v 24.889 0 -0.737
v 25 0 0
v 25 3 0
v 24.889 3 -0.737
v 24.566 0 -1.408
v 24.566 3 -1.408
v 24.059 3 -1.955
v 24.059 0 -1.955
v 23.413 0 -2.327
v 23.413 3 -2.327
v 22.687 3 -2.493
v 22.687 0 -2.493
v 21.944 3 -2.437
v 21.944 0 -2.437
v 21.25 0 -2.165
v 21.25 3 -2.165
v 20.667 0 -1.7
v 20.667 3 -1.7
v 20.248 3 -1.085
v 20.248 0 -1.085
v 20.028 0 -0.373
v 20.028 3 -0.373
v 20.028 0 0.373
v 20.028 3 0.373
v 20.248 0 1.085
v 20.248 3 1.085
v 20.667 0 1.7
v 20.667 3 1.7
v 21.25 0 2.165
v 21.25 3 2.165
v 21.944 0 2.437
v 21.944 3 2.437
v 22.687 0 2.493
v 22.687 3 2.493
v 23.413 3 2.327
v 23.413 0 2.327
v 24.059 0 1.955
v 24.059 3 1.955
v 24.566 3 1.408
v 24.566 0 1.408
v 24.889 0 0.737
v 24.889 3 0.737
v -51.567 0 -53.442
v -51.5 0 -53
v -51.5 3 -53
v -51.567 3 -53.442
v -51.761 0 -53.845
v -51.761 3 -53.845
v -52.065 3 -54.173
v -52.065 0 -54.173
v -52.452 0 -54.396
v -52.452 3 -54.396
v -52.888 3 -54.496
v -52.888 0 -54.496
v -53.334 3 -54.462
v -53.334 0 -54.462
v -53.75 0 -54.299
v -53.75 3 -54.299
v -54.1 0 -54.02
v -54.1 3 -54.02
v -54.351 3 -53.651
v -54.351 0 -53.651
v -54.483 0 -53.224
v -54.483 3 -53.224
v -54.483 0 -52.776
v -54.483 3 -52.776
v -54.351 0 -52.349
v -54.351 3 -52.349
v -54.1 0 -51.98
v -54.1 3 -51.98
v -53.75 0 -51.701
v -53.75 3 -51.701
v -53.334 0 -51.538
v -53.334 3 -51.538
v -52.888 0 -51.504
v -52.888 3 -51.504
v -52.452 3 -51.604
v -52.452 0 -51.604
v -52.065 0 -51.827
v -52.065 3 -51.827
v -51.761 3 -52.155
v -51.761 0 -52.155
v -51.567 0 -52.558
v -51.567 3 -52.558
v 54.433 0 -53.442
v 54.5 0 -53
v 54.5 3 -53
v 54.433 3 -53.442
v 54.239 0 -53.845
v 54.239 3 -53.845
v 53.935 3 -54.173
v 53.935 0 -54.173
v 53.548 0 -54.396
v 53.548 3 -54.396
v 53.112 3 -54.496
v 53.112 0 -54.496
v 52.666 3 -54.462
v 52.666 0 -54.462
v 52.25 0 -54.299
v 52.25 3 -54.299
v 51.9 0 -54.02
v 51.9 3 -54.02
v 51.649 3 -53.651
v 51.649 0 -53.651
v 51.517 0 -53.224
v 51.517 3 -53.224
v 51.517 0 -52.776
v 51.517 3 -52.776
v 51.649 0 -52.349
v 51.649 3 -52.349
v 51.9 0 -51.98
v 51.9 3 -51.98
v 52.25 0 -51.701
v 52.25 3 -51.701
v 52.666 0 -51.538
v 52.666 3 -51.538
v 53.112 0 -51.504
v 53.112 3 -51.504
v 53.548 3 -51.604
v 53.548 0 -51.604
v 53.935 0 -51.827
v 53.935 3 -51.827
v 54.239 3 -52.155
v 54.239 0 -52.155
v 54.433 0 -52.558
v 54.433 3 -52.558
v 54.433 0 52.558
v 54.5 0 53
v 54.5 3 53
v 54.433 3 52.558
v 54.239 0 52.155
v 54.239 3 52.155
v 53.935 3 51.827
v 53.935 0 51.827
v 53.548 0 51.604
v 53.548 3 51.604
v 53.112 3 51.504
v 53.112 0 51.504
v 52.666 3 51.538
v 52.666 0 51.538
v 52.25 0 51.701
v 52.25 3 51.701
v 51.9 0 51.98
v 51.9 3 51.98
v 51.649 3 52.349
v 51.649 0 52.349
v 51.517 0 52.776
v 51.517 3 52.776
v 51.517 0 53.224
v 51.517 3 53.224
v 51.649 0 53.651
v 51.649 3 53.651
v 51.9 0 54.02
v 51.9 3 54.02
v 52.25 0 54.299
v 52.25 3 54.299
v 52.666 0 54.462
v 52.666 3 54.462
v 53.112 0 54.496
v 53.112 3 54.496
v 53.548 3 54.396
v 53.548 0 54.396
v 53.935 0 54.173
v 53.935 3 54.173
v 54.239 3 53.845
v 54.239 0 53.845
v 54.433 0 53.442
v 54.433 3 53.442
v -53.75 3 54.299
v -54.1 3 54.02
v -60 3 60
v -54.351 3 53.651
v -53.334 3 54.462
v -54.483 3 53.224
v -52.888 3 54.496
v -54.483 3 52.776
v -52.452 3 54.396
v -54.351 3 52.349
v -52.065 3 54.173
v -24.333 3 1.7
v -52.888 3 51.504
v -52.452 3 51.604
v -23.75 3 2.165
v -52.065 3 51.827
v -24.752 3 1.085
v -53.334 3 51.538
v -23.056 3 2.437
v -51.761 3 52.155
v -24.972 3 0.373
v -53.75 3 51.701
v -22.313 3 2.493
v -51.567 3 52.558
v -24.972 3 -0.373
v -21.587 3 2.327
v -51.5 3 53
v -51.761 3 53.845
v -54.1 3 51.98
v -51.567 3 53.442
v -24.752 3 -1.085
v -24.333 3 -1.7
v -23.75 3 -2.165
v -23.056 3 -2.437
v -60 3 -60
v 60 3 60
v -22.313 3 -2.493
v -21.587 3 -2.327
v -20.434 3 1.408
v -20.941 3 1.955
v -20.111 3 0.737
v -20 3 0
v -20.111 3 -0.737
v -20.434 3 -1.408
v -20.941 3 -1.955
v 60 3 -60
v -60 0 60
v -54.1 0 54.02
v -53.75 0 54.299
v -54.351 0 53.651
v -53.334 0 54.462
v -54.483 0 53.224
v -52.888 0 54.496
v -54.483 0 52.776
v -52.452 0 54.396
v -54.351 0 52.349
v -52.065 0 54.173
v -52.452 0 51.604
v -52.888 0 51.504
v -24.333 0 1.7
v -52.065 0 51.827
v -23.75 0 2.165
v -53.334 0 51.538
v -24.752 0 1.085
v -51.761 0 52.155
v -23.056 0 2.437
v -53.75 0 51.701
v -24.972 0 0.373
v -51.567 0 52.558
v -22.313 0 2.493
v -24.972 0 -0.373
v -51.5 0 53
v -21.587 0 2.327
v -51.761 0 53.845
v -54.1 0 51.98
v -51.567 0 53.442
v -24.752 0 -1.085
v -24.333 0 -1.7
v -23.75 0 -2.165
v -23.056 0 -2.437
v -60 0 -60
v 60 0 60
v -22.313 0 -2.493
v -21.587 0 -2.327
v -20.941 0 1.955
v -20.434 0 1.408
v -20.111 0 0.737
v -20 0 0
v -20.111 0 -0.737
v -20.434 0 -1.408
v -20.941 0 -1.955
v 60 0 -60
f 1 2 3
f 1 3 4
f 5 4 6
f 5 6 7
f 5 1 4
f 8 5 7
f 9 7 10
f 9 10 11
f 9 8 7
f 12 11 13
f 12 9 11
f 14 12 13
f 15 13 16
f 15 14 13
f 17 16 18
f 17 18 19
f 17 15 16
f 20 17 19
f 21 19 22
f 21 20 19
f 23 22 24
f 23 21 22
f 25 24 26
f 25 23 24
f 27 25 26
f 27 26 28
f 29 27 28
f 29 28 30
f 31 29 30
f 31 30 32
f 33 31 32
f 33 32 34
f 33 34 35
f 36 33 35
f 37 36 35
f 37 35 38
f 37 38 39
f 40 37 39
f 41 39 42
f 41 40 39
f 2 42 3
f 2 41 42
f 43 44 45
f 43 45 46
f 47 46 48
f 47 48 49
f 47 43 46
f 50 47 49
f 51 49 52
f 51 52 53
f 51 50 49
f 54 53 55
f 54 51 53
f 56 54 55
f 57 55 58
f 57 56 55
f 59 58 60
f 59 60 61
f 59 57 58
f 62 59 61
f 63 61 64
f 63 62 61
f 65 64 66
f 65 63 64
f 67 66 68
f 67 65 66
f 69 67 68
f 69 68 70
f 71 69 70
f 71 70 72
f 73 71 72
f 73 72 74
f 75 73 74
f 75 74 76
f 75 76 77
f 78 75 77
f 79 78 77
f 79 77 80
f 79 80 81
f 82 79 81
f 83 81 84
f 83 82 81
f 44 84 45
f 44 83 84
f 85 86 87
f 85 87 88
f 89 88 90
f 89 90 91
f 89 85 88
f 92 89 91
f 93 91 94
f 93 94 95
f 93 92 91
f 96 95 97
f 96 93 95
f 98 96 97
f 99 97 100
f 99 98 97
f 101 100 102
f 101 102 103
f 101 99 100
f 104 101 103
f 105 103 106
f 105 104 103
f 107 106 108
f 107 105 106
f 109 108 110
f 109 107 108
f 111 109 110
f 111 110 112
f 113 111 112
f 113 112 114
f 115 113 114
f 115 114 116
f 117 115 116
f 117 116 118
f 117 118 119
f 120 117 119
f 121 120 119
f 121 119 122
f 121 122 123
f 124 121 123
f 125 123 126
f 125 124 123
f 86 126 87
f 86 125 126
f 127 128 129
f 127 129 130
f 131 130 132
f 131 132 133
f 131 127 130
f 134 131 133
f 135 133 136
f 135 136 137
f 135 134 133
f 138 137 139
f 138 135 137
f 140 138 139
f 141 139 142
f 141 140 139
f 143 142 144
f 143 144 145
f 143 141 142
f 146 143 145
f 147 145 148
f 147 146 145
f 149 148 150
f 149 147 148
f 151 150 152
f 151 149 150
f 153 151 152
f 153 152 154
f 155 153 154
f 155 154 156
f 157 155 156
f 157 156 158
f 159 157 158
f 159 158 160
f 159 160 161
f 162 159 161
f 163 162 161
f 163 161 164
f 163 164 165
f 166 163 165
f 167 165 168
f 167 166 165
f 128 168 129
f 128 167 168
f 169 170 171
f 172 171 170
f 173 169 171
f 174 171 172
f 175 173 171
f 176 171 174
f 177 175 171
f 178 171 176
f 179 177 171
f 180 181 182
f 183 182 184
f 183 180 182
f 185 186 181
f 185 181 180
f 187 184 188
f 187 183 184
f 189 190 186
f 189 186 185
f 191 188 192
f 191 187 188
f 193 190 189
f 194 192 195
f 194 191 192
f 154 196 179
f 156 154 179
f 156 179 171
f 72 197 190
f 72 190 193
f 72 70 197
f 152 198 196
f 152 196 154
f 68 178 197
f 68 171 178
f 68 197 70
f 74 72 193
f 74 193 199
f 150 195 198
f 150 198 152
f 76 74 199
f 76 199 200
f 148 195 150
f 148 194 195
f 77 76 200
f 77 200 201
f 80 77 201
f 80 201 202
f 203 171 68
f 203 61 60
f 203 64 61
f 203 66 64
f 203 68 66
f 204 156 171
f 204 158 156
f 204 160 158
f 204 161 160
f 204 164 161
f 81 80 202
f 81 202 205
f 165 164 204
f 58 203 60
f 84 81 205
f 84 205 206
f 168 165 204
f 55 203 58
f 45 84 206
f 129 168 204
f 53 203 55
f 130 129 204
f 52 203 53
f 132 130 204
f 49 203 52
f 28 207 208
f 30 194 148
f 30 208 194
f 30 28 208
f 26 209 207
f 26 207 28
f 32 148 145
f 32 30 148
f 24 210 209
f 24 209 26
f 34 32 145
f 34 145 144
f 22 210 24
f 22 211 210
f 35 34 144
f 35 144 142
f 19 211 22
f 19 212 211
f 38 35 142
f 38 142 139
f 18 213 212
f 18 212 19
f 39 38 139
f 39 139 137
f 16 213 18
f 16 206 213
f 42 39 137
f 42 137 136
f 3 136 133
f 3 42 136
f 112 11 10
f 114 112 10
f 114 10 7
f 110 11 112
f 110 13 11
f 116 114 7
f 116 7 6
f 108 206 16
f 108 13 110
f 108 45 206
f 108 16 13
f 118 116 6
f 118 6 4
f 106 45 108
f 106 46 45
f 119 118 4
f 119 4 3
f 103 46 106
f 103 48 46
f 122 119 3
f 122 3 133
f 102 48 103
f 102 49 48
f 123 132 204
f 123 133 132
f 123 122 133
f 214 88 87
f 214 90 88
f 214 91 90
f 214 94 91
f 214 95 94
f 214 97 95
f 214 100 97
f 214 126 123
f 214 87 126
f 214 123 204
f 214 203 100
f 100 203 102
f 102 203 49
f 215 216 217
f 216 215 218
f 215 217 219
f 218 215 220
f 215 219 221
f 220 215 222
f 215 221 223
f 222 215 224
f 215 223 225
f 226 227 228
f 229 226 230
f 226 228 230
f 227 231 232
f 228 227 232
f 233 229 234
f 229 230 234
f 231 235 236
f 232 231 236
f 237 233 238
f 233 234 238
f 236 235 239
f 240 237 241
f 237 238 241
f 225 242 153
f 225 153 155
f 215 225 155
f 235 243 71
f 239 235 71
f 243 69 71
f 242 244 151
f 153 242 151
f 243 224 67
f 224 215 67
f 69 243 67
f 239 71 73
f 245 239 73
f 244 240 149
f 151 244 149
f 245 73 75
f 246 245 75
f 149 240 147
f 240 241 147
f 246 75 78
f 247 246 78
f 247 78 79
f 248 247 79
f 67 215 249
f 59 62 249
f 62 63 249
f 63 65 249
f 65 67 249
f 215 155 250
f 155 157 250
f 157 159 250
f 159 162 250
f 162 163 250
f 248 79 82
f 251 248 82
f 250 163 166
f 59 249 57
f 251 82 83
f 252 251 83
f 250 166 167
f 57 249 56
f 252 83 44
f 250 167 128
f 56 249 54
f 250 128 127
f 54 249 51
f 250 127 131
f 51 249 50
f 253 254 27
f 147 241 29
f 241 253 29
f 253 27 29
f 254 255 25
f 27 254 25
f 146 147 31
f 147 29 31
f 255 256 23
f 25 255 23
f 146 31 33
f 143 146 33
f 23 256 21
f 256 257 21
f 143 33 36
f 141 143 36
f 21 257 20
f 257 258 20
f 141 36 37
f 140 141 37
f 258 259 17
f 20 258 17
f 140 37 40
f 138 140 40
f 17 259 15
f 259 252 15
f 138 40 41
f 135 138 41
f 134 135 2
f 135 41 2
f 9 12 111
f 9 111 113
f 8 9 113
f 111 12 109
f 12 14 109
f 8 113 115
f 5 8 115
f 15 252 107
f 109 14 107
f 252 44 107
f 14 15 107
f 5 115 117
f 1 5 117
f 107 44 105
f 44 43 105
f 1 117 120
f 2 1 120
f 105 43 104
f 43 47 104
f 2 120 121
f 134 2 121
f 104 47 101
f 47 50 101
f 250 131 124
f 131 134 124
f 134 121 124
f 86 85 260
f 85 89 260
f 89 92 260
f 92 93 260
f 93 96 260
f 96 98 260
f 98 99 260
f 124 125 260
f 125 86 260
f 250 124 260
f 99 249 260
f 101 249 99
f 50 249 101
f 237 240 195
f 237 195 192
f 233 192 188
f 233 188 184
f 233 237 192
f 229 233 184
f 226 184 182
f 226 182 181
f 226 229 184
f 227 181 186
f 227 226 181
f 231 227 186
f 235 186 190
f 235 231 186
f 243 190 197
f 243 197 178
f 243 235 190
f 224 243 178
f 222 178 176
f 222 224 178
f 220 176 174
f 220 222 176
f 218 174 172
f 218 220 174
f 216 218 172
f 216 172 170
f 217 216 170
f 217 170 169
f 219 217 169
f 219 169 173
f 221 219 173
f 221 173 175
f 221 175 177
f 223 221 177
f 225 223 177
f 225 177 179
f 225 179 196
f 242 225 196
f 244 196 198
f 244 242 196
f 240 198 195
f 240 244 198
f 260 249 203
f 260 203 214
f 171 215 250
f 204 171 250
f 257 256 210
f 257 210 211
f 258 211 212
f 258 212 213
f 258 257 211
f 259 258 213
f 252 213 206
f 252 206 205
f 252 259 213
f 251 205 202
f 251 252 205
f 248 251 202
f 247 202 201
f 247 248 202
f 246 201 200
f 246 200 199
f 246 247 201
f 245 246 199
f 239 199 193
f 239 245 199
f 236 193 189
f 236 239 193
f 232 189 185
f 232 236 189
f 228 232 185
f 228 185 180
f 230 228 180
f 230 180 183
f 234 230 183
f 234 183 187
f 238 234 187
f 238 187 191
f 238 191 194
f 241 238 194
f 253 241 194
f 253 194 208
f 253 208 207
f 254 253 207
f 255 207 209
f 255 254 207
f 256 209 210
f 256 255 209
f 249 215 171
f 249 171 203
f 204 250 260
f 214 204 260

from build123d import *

# Parameters (mm, degrees)
SKETCH1_W           = 120
SKETCH1_H           = 120
BOSS_EXTRUDE1_DEPTH = 3
SKETCH4_R           = 2.5
CUT_EXTRUDE2_DEPTH  = 3
SKETCH7_R           = 1.5
CUT_EXTRUDE3_DEPTH  = 3


with BuildPart() as part:
    # Sketch1 → Boss-Extrude1 (new body)
    with BuildSketch(Plane(origin=(0, 0, 0), x_dir=(1, 0, 0), z_dir=(0, 1, 0))):
        Rectangle(SKETCH1_W, SKETCH1_H)
    extrude(amount=BOSS_EXTRUDE1_DEPTH)

    # Sketch4 → Cut-Extrude2 (cut)
    with BuildSketch(Plane(origin=(0, 0, 0), x_dir=(1, 0, 0), z_dir=(0, 1, 0))):
        with Locations((-22.5, 0)):
            Circle(SKETCH4_R)
        with Locations((22.5, 0)):
            Circle(SKETCH4_R)
    extrude(amount=CUT_EXTRUDE2_DEPTH, mode=Mode.SUBTRACT)

    # Sketch7 → Cut-Extrude3 (cut)
    with BuildSketch(Plane(origin=(0, 0, 0), x_dir=(1, 0, 0), z_dir=(0, 1, 0))):
        with Locations((-53, 53)):
            Circle(SKETCH7_R)
        with Locations((53, 53)):
            Circle(SKETCH7_R)
        with Locations((-53, -53)):
            Circle(SKETCH7_R)
        with Locations((53, -53)):
            Circle(SKETCH7_R)
    extrude(amount=CUT_EXTRUDE3_DEPTH, mode=Mode.SUBTRACT)


solid = part.part
